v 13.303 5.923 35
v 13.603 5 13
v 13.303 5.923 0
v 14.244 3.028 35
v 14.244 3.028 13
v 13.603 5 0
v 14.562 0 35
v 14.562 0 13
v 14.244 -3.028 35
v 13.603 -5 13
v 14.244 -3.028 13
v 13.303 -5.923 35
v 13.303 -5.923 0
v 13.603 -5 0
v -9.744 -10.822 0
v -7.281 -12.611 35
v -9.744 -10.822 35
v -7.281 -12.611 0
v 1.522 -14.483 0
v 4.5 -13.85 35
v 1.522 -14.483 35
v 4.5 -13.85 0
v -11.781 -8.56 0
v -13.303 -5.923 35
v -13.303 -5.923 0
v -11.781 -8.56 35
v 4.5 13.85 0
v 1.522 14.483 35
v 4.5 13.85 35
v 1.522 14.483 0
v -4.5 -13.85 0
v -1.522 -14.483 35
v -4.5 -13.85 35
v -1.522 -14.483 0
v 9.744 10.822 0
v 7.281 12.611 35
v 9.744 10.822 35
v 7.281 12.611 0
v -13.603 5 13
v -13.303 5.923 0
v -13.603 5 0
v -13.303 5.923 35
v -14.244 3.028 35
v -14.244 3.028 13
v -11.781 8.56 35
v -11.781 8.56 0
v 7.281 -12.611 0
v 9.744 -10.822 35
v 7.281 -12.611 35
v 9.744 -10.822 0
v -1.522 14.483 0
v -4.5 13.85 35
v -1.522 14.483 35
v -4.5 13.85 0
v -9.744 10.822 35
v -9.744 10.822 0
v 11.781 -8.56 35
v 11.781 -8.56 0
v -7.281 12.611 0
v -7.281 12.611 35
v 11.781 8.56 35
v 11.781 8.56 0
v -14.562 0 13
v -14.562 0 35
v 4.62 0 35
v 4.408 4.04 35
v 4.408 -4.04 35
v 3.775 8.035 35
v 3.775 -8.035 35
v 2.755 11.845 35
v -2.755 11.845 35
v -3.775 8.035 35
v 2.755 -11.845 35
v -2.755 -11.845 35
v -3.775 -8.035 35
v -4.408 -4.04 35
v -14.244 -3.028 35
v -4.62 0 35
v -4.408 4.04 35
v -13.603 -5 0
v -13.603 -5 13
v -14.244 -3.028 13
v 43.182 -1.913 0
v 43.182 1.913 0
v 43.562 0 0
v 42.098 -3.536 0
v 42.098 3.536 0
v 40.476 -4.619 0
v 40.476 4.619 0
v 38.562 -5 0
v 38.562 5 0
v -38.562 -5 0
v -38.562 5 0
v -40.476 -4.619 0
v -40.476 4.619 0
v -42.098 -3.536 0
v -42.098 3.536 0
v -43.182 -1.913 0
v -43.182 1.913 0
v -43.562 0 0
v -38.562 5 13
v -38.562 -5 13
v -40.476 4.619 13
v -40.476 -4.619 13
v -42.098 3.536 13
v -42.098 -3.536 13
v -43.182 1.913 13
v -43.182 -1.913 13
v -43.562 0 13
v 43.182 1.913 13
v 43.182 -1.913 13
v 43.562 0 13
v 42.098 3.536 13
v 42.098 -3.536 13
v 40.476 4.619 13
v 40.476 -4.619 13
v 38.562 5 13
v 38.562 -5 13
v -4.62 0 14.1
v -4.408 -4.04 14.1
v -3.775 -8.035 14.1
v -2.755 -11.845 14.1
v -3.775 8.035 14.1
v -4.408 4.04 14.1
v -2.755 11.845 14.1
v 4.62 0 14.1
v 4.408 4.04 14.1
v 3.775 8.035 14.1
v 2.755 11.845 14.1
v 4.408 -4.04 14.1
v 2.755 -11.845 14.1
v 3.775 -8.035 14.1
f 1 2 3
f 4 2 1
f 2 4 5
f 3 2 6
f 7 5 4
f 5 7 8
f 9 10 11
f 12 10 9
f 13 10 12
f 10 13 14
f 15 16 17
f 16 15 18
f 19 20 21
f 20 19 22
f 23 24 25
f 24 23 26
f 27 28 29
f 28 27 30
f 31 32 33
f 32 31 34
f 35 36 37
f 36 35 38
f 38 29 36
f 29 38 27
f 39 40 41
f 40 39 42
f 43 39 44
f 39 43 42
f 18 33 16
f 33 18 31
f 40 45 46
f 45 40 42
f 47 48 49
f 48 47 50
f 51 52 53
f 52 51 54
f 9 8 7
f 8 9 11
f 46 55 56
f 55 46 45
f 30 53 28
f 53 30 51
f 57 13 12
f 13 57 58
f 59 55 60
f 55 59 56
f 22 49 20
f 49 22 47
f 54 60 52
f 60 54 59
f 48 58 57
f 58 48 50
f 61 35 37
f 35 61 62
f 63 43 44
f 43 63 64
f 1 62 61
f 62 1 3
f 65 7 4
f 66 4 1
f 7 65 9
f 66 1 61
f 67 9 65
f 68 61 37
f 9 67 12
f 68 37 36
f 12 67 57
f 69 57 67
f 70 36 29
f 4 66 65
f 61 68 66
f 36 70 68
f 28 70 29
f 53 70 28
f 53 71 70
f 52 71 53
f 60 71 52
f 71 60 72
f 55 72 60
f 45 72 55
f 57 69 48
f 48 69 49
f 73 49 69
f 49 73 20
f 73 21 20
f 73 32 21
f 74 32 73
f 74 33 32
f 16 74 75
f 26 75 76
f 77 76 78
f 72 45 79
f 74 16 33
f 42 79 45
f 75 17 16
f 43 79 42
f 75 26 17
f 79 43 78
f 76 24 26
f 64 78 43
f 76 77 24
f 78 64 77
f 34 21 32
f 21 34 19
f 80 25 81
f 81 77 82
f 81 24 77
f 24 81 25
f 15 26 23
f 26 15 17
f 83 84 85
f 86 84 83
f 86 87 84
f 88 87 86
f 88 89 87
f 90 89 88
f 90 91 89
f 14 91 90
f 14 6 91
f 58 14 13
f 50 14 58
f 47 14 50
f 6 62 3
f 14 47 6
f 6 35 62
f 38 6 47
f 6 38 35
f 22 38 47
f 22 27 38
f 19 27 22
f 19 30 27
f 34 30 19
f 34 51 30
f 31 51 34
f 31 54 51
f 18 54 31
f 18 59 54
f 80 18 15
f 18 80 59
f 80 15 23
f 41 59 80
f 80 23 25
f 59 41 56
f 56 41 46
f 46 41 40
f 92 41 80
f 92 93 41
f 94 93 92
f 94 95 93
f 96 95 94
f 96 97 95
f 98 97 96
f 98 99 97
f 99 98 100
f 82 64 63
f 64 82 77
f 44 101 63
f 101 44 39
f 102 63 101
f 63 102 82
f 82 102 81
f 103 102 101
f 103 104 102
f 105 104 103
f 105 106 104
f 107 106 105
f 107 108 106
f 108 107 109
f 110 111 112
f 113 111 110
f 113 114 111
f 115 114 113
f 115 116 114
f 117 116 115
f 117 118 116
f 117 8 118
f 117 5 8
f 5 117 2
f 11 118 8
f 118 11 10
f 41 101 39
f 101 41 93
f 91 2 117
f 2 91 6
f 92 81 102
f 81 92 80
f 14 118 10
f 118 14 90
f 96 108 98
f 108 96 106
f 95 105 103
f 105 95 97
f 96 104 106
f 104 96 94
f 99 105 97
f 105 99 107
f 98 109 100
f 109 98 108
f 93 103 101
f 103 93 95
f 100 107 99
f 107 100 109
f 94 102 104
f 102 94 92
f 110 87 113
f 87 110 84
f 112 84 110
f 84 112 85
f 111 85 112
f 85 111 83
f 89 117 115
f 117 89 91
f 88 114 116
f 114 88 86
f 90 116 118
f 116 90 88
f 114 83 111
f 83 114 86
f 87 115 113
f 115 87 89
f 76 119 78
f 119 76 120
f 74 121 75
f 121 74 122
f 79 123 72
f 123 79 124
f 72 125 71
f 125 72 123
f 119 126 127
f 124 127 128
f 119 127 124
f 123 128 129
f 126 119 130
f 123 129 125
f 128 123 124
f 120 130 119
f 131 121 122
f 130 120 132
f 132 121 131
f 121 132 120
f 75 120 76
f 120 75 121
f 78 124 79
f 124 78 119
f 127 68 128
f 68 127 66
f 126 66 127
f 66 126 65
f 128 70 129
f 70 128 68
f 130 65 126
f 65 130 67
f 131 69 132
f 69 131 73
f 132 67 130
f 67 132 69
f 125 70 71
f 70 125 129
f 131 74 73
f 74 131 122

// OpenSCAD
cylinder_height = 35;
wall_thickness = 2.4;

handle_height = 13;
handle_length = 24;
handle_thickness = 10;

hole_desired_height = 20.4;
hole_desired_width = 22.69;
hole_desired_middle_thickness = 8.24;
hole_desired_outer_thickness = 4.52;

tolerance = 0.5;

hole_height = hole_desired_height + tolerance;
hole_width = hole_desired_width + 2*tolerance;
hole_middle_thickness = hole_desired_middle_thickness + 2*tolerance;
hole_outer_thickness = hole_desired_outer_thickness + 2*tolerance;

cylinder_radius = wall_thickness + sqrt(pow(hole_outer_thickness / 2,2) +pow(hole_width/2,2));

module dummy(){}

nudge = 0.01;

module main() {
    cylinder(h=cylinder_height, r=cylinder_radius);
    translate([-handle_length-cylinder_radius,-handle_thickness/2,0]) cube([2*handle_length+2*cylinder_radius,handle_thickness,handle_height]);
    translate([-handle_length-cylinder_radius,0,0]) cylinder(h=handle_height, d=handle_thickness);
    translate([handle_length+cylinder_radius,0,0]) cylinder(h=handle_height, d=handle_thickness);
}

module hole() {
    delta = (hole_middle_thickness - hole_outer_thickness)/2;
    a = hole_width / 2;
    r = (a*a+delta*delta)/(2*delta);
    render(convexity=5)
    translate([0,0,cylinder_height-hole_height]) 
    intersection() {
    translate([r-delta-hole_outer_thickness/2,0,0]) cylinder(r=r, h=hole_height+nudge,$fn=60);
    translate([-r+delta+hole_outer_thickness/2,0,0]) cylinder(r=r, h=hole_height+nudge,$fn=60);
    translate([0,0,hole_height/2]) cube(center=true,[hole_middle_thickness,hole_width,hole_height+nudge]);
    }
}

difference() {
render(convexity=15)
    main();
render(convexity=15)
    hole();
}
